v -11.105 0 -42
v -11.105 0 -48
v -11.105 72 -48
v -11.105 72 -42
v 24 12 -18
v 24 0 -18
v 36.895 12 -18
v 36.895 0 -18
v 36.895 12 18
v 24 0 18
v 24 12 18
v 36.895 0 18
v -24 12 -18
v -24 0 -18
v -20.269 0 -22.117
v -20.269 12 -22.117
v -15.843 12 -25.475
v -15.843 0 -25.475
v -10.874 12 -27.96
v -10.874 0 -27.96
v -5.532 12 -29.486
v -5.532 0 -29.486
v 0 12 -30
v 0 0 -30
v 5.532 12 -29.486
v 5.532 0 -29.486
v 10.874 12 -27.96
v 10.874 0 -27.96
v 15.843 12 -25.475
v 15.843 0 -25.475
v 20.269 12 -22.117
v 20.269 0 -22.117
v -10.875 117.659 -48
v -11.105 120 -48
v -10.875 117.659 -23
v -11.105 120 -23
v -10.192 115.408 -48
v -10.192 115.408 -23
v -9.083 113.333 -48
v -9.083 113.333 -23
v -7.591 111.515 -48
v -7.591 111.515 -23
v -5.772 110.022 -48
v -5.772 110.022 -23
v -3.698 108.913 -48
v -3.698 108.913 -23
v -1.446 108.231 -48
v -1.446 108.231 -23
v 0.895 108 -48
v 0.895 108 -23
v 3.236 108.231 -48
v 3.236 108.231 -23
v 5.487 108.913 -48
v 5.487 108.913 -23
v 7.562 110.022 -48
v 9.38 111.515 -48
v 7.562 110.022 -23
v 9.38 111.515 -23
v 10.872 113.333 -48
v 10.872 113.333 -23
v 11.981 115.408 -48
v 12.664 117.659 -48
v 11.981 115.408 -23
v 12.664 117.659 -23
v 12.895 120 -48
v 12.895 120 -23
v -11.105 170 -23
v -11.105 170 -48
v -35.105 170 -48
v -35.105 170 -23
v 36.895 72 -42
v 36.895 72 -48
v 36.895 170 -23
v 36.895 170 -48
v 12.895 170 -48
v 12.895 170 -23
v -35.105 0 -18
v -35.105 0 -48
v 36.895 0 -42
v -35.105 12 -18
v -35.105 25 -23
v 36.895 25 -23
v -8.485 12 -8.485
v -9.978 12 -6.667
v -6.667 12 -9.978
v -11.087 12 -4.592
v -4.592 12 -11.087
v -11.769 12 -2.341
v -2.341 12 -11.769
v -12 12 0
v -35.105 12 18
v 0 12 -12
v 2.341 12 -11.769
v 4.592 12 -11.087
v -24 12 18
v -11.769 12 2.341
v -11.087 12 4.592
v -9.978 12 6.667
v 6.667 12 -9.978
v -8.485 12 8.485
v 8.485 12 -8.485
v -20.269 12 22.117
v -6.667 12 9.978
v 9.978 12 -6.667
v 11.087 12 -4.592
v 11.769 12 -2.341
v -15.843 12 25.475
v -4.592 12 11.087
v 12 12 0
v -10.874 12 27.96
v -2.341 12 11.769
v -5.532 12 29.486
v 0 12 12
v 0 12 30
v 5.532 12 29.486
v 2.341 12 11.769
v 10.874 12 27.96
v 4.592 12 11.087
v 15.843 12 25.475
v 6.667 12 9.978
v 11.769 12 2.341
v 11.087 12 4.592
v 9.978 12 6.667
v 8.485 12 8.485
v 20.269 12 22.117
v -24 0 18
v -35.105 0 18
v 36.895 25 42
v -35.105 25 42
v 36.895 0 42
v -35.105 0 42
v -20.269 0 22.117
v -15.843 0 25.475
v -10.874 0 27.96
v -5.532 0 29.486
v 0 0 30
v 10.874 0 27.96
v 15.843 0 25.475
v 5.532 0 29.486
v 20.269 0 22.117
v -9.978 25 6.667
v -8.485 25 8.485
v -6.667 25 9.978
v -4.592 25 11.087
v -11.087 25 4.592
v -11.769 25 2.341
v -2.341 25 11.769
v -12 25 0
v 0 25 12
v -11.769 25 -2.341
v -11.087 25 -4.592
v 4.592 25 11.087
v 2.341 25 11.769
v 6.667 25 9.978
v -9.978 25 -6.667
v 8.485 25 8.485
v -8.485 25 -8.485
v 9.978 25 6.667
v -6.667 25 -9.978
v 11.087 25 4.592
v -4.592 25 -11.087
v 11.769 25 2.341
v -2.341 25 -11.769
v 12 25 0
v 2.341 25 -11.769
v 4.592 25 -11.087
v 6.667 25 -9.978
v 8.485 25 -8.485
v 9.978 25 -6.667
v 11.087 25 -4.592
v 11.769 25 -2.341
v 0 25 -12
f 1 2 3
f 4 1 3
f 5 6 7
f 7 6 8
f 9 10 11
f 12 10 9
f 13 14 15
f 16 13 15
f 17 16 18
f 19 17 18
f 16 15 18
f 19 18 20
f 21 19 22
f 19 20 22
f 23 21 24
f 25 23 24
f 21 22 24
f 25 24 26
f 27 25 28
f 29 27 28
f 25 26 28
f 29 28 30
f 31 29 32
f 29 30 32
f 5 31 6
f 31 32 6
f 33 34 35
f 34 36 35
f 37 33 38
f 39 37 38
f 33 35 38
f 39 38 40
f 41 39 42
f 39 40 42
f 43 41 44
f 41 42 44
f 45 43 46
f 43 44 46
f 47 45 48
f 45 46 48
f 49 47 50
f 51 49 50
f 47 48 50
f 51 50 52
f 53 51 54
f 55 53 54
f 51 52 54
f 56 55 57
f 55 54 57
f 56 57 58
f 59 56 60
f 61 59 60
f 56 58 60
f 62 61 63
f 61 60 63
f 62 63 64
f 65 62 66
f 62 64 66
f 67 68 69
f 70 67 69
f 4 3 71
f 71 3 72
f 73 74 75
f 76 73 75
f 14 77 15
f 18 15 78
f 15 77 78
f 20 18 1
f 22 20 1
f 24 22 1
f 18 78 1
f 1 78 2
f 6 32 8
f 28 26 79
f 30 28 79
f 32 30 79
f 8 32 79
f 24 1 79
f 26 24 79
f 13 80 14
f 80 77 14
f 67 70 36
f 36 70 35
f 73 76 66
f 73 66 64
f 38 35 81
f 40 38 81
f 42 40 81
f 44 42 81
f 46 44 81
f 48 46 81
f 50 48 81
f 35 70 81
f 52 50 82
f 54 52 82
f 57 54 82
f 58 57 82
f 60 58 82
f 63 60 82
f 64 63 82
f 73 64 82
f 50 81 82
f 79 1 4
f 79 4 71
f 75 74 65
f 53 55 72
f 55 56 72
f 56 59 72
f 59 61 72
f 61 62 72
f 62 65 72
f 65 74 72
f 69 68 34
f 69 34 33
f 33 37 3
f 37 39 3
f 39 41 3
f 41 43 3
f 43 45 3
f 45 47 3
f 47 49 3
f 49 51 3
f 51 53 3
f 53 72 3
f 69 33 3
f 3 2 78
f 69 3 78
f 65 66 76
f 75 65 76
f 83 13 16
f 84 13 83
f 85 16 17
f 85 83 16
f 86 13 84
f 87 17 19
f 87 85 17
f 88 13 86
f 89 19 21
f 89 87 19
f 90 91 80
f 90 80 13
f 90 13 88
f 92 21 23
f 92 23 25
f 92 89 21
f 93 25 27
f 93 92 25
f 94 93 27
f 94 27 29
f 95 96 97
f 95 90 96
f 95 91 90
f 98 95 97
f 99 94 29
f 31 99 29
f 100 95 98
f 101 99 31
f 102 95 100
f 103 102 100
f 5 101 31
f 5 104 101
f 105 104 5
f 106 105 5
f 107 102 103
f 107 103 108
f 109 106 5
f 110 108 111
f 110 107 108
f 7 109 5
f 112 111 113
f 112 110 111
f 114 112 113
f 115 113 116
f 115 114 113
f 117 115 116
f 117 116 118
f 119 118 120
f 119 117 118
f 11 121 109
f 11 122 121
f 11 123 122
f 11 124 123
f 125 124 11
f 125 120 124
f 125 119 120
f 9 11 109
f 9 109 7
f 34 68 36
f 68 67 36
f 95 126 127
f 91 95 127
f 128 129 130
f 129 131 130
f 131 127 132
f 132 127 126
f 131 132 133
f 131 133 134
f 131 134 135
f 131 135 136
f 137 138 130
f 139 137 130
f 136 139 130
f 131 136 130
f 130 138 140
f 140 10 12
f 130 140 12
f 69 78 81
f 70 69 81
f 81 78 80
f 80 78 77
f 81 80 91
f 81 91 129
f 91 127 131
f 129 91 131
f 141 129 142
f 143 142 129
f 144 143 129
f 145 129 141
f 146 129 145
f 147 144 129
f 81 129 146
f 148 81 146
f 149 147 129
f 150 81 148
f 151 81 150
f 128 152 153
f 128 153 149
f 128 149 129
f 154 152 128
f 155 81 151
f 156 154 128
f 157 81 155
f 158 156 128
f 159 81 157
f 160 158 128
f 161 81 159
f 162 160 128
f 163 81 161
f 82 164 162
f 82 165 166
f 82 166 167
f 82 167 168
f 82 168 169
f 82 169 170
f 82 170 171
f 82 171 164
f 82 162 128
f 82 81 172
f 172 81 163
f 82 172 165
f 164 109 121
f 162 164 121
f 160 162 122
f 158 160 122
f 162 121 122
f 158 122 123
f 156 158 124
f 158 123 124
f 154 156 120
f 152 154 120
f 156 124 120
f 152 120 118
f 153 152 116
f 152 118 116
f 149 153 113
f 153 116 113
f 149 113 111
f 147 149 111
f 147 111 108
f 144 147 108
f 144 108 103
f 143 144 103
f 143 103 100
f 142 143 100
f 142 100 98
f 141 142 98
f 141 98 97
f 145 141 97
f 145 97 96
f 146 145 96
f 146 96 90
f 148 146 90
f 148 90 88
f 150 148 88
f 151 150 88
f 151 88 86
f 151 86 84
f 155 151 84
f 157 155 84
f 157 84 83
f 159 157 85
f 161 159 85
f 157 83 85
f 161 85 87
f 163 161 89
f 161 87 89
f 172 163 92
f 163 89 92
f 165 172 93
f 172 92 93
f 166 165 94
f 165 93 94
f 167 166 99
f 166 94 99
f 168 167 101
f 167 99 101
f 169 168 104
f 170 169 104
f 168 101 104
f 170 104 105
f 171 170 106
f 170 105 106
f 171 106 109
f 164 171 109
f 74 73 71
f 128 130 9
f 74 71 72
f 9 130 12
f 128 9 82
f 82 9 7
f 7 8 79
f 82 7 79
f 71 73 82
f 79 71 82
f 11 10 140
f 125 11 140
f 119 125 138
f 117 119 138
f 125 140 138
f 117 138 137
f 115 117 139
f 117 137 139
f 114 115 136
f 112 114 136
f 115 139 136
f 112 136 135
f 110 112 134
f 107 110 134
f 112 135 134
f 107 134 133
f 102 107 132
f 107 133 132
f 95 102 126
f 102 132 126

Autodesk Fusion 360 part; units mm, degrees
sketch "Sketch1" plane through (0, 0, 0) normal (0, 1, 0) x (1, 0, 0)
  line L0 (-35.1053, -42) -> (36.8947, -42)
  line L1 (36.8947, -42) -> (36.8947, 48)
  line L2 (36.8947, 48) -> (-35.1053, 48)
  line L3 (-35.1053, 48) -> (-35.1053, -42)
  point P0 (0.8947, 48)
  dimension "d3" = 90
  dimension "d4" = 72
  dimension "d7" = 48
extrude "Extrude1" add sketch "Sketch1" along normal blind 25
sketch "Sketch2" plane through (0, 0, 0) normal (0, -1, 0) x (1, 0, 0)
  line L0 (-35.1053, 42) -> (-35.1053, -48)
  line L1 (-35.1053, -48) -> (36.8947, -48)
  line L2 (36.8947, -48) -> (36.8947, 42)
  line L3 (36.8947, 42) -> (-35.1053, 42)
  line L4 (-35.1053, -18) -> (-24, -18)
  line L5 (24, -18) -> (36.8947, -18)
  line L6 (24, 18) -> (36.8947, 18)
  line L7 (-24, 18) -> (-35.1053, 18)
  arc A0 (-24, -18) -> (24, -18) centre (0, 0) ccw
  arc A1 (24, 18) -> (-24, 18) centre (0, 0) ccw
  dimension "d11" = 60
  dimension "d12" = 30
  dimension "d13" = 36
extrude "Extrude2" cut sketch "Sketch2" against normal blind 12 contours L0 L2 L4 L5 L6 L7 A0 A1
sketch "Sketch3" plane through (0, 12, 0) normal (0, -1, 0) x (1, 0, 0)
  arc A0 (24, 18) -> (-24, 18) centre (0, 0) ccw
  line L0 (-24, 18) -> (-35.1053, 18)
  line L1 (-35.1053, 18) -> (-35.1053, -18)
  line L2 (-35.1053, -18) -> (-24, -18)
  arc A1 (-24, -18) -> (24, -18) centre (0, 0) ccw
  line L3 (24, -18) -> (36.8947, -18)
  line L4 (36.8947, -18) -> (36.8947, 18)
  line L5 (36.8947, 18) -> (24, 18)
  circle A2 centre (0, 0) radius 12
  dimension "d16" = 24
extrude "Extrude3" cut sketch "Sketch3" against normal blind 13 contours A2
sketch "Sketch4" plane through (0, 25, 0) normal (0, 1, 0) x (-1, 0, 0)
  circle A0 centre (0, 0) radius 12
  line L0 (35.1053, -48) -> (35.1053, 42)
  line L1 (35.1053, 42) -> (-36.8947, 42)
  line L2 (-36.8947, 42) -> (-36.8947, -48)
  line L3 (-36.8947, -48) -> (35.1053, -48)
  line L4 (-36.8947, -48) -> (35.1053, -48)
  line L5 (35.1053, -48) -> (35.1053, -23)
  line L6 (35.1053, -23) -> (-36.8947, -23)
  line L7 (-36.8947, -23) -> (-36.8947, -48)
  dimension "d19" = 25
extrude "Extrude4" add sketch "Sketch4" along normal blind 145 contours L0 L2 L3 L4 L5 L6 L7
sketch "Sketch5" plane through (0, 0, -23) normal (0, 0, 1) x (-1, 0, 0)
  line L0 (35.1053, -25) -> (-36.8947, -25)
  line L1 (-36.8947, -25) -> (-36.8947, -170)
  line L2 (-36.8947, -170) -> (35.1053, -170)
  line L3 (35.1053, -170) -> (35.1053, -25)
  line L4 (11.1053, -170) -> (11.1053, -120)
  arc A0 (11.1053, -120) -> (-12.8947, -120) centre (-0.8947, -120) ccw
  line L5 (-12.8947, -120) -> (-12.8947, -170)
  line L6 (11.1053, -170) -> (-12.8947, -170)
  dimension "d22" = 24
  dimension "d23" = 24
  dimension "d24" = 50
extrude "Extrude5" cut sketch "Sketch5" against normal blind 25 contours L2 L4 A0 L5 L6
sketch "Sketch6" plane through (0, 0, -48) normal (0, 0, -1) x (1, 0, 0)
  line L0 (-11.1053, -170) -> (-11.1053, -120)
  arc A0 (12.8947, -120) -> (-11.1053, -120) centre (0.8947, -120) ccw
  line L1 (12.8947, -120) -> (12.8947, -170)
  line L2 (12.8947, -170) -> (36.8947, -170)
  line L3 (36.8947, -170) -> (36.8947, 0)
  line L4 (36.8947, 0) -> (-35.1053, 0)
  line L5 (-35.1053, 0) -> (-35.1053, -170)
  line L6 (-35.1053, -170) -> (-11.1053, -170)
  line L7 (36.8947, 0) -> (-11.1053, 0)
  line L8 (-11.1053, 0) -> (-11.1053, -72)
  line L9 (-11.1053, -72) -> (36.8947, -72)
  line L10 (36.8947, -72) -> (36.8947, 0)
  dimension "d27" = 48
  dimension "d28" = 72
extrude "Extrude6" cut sketch "Sketch6" against normal blind 6 contours L3 L4 L7 L8 L9 L10
